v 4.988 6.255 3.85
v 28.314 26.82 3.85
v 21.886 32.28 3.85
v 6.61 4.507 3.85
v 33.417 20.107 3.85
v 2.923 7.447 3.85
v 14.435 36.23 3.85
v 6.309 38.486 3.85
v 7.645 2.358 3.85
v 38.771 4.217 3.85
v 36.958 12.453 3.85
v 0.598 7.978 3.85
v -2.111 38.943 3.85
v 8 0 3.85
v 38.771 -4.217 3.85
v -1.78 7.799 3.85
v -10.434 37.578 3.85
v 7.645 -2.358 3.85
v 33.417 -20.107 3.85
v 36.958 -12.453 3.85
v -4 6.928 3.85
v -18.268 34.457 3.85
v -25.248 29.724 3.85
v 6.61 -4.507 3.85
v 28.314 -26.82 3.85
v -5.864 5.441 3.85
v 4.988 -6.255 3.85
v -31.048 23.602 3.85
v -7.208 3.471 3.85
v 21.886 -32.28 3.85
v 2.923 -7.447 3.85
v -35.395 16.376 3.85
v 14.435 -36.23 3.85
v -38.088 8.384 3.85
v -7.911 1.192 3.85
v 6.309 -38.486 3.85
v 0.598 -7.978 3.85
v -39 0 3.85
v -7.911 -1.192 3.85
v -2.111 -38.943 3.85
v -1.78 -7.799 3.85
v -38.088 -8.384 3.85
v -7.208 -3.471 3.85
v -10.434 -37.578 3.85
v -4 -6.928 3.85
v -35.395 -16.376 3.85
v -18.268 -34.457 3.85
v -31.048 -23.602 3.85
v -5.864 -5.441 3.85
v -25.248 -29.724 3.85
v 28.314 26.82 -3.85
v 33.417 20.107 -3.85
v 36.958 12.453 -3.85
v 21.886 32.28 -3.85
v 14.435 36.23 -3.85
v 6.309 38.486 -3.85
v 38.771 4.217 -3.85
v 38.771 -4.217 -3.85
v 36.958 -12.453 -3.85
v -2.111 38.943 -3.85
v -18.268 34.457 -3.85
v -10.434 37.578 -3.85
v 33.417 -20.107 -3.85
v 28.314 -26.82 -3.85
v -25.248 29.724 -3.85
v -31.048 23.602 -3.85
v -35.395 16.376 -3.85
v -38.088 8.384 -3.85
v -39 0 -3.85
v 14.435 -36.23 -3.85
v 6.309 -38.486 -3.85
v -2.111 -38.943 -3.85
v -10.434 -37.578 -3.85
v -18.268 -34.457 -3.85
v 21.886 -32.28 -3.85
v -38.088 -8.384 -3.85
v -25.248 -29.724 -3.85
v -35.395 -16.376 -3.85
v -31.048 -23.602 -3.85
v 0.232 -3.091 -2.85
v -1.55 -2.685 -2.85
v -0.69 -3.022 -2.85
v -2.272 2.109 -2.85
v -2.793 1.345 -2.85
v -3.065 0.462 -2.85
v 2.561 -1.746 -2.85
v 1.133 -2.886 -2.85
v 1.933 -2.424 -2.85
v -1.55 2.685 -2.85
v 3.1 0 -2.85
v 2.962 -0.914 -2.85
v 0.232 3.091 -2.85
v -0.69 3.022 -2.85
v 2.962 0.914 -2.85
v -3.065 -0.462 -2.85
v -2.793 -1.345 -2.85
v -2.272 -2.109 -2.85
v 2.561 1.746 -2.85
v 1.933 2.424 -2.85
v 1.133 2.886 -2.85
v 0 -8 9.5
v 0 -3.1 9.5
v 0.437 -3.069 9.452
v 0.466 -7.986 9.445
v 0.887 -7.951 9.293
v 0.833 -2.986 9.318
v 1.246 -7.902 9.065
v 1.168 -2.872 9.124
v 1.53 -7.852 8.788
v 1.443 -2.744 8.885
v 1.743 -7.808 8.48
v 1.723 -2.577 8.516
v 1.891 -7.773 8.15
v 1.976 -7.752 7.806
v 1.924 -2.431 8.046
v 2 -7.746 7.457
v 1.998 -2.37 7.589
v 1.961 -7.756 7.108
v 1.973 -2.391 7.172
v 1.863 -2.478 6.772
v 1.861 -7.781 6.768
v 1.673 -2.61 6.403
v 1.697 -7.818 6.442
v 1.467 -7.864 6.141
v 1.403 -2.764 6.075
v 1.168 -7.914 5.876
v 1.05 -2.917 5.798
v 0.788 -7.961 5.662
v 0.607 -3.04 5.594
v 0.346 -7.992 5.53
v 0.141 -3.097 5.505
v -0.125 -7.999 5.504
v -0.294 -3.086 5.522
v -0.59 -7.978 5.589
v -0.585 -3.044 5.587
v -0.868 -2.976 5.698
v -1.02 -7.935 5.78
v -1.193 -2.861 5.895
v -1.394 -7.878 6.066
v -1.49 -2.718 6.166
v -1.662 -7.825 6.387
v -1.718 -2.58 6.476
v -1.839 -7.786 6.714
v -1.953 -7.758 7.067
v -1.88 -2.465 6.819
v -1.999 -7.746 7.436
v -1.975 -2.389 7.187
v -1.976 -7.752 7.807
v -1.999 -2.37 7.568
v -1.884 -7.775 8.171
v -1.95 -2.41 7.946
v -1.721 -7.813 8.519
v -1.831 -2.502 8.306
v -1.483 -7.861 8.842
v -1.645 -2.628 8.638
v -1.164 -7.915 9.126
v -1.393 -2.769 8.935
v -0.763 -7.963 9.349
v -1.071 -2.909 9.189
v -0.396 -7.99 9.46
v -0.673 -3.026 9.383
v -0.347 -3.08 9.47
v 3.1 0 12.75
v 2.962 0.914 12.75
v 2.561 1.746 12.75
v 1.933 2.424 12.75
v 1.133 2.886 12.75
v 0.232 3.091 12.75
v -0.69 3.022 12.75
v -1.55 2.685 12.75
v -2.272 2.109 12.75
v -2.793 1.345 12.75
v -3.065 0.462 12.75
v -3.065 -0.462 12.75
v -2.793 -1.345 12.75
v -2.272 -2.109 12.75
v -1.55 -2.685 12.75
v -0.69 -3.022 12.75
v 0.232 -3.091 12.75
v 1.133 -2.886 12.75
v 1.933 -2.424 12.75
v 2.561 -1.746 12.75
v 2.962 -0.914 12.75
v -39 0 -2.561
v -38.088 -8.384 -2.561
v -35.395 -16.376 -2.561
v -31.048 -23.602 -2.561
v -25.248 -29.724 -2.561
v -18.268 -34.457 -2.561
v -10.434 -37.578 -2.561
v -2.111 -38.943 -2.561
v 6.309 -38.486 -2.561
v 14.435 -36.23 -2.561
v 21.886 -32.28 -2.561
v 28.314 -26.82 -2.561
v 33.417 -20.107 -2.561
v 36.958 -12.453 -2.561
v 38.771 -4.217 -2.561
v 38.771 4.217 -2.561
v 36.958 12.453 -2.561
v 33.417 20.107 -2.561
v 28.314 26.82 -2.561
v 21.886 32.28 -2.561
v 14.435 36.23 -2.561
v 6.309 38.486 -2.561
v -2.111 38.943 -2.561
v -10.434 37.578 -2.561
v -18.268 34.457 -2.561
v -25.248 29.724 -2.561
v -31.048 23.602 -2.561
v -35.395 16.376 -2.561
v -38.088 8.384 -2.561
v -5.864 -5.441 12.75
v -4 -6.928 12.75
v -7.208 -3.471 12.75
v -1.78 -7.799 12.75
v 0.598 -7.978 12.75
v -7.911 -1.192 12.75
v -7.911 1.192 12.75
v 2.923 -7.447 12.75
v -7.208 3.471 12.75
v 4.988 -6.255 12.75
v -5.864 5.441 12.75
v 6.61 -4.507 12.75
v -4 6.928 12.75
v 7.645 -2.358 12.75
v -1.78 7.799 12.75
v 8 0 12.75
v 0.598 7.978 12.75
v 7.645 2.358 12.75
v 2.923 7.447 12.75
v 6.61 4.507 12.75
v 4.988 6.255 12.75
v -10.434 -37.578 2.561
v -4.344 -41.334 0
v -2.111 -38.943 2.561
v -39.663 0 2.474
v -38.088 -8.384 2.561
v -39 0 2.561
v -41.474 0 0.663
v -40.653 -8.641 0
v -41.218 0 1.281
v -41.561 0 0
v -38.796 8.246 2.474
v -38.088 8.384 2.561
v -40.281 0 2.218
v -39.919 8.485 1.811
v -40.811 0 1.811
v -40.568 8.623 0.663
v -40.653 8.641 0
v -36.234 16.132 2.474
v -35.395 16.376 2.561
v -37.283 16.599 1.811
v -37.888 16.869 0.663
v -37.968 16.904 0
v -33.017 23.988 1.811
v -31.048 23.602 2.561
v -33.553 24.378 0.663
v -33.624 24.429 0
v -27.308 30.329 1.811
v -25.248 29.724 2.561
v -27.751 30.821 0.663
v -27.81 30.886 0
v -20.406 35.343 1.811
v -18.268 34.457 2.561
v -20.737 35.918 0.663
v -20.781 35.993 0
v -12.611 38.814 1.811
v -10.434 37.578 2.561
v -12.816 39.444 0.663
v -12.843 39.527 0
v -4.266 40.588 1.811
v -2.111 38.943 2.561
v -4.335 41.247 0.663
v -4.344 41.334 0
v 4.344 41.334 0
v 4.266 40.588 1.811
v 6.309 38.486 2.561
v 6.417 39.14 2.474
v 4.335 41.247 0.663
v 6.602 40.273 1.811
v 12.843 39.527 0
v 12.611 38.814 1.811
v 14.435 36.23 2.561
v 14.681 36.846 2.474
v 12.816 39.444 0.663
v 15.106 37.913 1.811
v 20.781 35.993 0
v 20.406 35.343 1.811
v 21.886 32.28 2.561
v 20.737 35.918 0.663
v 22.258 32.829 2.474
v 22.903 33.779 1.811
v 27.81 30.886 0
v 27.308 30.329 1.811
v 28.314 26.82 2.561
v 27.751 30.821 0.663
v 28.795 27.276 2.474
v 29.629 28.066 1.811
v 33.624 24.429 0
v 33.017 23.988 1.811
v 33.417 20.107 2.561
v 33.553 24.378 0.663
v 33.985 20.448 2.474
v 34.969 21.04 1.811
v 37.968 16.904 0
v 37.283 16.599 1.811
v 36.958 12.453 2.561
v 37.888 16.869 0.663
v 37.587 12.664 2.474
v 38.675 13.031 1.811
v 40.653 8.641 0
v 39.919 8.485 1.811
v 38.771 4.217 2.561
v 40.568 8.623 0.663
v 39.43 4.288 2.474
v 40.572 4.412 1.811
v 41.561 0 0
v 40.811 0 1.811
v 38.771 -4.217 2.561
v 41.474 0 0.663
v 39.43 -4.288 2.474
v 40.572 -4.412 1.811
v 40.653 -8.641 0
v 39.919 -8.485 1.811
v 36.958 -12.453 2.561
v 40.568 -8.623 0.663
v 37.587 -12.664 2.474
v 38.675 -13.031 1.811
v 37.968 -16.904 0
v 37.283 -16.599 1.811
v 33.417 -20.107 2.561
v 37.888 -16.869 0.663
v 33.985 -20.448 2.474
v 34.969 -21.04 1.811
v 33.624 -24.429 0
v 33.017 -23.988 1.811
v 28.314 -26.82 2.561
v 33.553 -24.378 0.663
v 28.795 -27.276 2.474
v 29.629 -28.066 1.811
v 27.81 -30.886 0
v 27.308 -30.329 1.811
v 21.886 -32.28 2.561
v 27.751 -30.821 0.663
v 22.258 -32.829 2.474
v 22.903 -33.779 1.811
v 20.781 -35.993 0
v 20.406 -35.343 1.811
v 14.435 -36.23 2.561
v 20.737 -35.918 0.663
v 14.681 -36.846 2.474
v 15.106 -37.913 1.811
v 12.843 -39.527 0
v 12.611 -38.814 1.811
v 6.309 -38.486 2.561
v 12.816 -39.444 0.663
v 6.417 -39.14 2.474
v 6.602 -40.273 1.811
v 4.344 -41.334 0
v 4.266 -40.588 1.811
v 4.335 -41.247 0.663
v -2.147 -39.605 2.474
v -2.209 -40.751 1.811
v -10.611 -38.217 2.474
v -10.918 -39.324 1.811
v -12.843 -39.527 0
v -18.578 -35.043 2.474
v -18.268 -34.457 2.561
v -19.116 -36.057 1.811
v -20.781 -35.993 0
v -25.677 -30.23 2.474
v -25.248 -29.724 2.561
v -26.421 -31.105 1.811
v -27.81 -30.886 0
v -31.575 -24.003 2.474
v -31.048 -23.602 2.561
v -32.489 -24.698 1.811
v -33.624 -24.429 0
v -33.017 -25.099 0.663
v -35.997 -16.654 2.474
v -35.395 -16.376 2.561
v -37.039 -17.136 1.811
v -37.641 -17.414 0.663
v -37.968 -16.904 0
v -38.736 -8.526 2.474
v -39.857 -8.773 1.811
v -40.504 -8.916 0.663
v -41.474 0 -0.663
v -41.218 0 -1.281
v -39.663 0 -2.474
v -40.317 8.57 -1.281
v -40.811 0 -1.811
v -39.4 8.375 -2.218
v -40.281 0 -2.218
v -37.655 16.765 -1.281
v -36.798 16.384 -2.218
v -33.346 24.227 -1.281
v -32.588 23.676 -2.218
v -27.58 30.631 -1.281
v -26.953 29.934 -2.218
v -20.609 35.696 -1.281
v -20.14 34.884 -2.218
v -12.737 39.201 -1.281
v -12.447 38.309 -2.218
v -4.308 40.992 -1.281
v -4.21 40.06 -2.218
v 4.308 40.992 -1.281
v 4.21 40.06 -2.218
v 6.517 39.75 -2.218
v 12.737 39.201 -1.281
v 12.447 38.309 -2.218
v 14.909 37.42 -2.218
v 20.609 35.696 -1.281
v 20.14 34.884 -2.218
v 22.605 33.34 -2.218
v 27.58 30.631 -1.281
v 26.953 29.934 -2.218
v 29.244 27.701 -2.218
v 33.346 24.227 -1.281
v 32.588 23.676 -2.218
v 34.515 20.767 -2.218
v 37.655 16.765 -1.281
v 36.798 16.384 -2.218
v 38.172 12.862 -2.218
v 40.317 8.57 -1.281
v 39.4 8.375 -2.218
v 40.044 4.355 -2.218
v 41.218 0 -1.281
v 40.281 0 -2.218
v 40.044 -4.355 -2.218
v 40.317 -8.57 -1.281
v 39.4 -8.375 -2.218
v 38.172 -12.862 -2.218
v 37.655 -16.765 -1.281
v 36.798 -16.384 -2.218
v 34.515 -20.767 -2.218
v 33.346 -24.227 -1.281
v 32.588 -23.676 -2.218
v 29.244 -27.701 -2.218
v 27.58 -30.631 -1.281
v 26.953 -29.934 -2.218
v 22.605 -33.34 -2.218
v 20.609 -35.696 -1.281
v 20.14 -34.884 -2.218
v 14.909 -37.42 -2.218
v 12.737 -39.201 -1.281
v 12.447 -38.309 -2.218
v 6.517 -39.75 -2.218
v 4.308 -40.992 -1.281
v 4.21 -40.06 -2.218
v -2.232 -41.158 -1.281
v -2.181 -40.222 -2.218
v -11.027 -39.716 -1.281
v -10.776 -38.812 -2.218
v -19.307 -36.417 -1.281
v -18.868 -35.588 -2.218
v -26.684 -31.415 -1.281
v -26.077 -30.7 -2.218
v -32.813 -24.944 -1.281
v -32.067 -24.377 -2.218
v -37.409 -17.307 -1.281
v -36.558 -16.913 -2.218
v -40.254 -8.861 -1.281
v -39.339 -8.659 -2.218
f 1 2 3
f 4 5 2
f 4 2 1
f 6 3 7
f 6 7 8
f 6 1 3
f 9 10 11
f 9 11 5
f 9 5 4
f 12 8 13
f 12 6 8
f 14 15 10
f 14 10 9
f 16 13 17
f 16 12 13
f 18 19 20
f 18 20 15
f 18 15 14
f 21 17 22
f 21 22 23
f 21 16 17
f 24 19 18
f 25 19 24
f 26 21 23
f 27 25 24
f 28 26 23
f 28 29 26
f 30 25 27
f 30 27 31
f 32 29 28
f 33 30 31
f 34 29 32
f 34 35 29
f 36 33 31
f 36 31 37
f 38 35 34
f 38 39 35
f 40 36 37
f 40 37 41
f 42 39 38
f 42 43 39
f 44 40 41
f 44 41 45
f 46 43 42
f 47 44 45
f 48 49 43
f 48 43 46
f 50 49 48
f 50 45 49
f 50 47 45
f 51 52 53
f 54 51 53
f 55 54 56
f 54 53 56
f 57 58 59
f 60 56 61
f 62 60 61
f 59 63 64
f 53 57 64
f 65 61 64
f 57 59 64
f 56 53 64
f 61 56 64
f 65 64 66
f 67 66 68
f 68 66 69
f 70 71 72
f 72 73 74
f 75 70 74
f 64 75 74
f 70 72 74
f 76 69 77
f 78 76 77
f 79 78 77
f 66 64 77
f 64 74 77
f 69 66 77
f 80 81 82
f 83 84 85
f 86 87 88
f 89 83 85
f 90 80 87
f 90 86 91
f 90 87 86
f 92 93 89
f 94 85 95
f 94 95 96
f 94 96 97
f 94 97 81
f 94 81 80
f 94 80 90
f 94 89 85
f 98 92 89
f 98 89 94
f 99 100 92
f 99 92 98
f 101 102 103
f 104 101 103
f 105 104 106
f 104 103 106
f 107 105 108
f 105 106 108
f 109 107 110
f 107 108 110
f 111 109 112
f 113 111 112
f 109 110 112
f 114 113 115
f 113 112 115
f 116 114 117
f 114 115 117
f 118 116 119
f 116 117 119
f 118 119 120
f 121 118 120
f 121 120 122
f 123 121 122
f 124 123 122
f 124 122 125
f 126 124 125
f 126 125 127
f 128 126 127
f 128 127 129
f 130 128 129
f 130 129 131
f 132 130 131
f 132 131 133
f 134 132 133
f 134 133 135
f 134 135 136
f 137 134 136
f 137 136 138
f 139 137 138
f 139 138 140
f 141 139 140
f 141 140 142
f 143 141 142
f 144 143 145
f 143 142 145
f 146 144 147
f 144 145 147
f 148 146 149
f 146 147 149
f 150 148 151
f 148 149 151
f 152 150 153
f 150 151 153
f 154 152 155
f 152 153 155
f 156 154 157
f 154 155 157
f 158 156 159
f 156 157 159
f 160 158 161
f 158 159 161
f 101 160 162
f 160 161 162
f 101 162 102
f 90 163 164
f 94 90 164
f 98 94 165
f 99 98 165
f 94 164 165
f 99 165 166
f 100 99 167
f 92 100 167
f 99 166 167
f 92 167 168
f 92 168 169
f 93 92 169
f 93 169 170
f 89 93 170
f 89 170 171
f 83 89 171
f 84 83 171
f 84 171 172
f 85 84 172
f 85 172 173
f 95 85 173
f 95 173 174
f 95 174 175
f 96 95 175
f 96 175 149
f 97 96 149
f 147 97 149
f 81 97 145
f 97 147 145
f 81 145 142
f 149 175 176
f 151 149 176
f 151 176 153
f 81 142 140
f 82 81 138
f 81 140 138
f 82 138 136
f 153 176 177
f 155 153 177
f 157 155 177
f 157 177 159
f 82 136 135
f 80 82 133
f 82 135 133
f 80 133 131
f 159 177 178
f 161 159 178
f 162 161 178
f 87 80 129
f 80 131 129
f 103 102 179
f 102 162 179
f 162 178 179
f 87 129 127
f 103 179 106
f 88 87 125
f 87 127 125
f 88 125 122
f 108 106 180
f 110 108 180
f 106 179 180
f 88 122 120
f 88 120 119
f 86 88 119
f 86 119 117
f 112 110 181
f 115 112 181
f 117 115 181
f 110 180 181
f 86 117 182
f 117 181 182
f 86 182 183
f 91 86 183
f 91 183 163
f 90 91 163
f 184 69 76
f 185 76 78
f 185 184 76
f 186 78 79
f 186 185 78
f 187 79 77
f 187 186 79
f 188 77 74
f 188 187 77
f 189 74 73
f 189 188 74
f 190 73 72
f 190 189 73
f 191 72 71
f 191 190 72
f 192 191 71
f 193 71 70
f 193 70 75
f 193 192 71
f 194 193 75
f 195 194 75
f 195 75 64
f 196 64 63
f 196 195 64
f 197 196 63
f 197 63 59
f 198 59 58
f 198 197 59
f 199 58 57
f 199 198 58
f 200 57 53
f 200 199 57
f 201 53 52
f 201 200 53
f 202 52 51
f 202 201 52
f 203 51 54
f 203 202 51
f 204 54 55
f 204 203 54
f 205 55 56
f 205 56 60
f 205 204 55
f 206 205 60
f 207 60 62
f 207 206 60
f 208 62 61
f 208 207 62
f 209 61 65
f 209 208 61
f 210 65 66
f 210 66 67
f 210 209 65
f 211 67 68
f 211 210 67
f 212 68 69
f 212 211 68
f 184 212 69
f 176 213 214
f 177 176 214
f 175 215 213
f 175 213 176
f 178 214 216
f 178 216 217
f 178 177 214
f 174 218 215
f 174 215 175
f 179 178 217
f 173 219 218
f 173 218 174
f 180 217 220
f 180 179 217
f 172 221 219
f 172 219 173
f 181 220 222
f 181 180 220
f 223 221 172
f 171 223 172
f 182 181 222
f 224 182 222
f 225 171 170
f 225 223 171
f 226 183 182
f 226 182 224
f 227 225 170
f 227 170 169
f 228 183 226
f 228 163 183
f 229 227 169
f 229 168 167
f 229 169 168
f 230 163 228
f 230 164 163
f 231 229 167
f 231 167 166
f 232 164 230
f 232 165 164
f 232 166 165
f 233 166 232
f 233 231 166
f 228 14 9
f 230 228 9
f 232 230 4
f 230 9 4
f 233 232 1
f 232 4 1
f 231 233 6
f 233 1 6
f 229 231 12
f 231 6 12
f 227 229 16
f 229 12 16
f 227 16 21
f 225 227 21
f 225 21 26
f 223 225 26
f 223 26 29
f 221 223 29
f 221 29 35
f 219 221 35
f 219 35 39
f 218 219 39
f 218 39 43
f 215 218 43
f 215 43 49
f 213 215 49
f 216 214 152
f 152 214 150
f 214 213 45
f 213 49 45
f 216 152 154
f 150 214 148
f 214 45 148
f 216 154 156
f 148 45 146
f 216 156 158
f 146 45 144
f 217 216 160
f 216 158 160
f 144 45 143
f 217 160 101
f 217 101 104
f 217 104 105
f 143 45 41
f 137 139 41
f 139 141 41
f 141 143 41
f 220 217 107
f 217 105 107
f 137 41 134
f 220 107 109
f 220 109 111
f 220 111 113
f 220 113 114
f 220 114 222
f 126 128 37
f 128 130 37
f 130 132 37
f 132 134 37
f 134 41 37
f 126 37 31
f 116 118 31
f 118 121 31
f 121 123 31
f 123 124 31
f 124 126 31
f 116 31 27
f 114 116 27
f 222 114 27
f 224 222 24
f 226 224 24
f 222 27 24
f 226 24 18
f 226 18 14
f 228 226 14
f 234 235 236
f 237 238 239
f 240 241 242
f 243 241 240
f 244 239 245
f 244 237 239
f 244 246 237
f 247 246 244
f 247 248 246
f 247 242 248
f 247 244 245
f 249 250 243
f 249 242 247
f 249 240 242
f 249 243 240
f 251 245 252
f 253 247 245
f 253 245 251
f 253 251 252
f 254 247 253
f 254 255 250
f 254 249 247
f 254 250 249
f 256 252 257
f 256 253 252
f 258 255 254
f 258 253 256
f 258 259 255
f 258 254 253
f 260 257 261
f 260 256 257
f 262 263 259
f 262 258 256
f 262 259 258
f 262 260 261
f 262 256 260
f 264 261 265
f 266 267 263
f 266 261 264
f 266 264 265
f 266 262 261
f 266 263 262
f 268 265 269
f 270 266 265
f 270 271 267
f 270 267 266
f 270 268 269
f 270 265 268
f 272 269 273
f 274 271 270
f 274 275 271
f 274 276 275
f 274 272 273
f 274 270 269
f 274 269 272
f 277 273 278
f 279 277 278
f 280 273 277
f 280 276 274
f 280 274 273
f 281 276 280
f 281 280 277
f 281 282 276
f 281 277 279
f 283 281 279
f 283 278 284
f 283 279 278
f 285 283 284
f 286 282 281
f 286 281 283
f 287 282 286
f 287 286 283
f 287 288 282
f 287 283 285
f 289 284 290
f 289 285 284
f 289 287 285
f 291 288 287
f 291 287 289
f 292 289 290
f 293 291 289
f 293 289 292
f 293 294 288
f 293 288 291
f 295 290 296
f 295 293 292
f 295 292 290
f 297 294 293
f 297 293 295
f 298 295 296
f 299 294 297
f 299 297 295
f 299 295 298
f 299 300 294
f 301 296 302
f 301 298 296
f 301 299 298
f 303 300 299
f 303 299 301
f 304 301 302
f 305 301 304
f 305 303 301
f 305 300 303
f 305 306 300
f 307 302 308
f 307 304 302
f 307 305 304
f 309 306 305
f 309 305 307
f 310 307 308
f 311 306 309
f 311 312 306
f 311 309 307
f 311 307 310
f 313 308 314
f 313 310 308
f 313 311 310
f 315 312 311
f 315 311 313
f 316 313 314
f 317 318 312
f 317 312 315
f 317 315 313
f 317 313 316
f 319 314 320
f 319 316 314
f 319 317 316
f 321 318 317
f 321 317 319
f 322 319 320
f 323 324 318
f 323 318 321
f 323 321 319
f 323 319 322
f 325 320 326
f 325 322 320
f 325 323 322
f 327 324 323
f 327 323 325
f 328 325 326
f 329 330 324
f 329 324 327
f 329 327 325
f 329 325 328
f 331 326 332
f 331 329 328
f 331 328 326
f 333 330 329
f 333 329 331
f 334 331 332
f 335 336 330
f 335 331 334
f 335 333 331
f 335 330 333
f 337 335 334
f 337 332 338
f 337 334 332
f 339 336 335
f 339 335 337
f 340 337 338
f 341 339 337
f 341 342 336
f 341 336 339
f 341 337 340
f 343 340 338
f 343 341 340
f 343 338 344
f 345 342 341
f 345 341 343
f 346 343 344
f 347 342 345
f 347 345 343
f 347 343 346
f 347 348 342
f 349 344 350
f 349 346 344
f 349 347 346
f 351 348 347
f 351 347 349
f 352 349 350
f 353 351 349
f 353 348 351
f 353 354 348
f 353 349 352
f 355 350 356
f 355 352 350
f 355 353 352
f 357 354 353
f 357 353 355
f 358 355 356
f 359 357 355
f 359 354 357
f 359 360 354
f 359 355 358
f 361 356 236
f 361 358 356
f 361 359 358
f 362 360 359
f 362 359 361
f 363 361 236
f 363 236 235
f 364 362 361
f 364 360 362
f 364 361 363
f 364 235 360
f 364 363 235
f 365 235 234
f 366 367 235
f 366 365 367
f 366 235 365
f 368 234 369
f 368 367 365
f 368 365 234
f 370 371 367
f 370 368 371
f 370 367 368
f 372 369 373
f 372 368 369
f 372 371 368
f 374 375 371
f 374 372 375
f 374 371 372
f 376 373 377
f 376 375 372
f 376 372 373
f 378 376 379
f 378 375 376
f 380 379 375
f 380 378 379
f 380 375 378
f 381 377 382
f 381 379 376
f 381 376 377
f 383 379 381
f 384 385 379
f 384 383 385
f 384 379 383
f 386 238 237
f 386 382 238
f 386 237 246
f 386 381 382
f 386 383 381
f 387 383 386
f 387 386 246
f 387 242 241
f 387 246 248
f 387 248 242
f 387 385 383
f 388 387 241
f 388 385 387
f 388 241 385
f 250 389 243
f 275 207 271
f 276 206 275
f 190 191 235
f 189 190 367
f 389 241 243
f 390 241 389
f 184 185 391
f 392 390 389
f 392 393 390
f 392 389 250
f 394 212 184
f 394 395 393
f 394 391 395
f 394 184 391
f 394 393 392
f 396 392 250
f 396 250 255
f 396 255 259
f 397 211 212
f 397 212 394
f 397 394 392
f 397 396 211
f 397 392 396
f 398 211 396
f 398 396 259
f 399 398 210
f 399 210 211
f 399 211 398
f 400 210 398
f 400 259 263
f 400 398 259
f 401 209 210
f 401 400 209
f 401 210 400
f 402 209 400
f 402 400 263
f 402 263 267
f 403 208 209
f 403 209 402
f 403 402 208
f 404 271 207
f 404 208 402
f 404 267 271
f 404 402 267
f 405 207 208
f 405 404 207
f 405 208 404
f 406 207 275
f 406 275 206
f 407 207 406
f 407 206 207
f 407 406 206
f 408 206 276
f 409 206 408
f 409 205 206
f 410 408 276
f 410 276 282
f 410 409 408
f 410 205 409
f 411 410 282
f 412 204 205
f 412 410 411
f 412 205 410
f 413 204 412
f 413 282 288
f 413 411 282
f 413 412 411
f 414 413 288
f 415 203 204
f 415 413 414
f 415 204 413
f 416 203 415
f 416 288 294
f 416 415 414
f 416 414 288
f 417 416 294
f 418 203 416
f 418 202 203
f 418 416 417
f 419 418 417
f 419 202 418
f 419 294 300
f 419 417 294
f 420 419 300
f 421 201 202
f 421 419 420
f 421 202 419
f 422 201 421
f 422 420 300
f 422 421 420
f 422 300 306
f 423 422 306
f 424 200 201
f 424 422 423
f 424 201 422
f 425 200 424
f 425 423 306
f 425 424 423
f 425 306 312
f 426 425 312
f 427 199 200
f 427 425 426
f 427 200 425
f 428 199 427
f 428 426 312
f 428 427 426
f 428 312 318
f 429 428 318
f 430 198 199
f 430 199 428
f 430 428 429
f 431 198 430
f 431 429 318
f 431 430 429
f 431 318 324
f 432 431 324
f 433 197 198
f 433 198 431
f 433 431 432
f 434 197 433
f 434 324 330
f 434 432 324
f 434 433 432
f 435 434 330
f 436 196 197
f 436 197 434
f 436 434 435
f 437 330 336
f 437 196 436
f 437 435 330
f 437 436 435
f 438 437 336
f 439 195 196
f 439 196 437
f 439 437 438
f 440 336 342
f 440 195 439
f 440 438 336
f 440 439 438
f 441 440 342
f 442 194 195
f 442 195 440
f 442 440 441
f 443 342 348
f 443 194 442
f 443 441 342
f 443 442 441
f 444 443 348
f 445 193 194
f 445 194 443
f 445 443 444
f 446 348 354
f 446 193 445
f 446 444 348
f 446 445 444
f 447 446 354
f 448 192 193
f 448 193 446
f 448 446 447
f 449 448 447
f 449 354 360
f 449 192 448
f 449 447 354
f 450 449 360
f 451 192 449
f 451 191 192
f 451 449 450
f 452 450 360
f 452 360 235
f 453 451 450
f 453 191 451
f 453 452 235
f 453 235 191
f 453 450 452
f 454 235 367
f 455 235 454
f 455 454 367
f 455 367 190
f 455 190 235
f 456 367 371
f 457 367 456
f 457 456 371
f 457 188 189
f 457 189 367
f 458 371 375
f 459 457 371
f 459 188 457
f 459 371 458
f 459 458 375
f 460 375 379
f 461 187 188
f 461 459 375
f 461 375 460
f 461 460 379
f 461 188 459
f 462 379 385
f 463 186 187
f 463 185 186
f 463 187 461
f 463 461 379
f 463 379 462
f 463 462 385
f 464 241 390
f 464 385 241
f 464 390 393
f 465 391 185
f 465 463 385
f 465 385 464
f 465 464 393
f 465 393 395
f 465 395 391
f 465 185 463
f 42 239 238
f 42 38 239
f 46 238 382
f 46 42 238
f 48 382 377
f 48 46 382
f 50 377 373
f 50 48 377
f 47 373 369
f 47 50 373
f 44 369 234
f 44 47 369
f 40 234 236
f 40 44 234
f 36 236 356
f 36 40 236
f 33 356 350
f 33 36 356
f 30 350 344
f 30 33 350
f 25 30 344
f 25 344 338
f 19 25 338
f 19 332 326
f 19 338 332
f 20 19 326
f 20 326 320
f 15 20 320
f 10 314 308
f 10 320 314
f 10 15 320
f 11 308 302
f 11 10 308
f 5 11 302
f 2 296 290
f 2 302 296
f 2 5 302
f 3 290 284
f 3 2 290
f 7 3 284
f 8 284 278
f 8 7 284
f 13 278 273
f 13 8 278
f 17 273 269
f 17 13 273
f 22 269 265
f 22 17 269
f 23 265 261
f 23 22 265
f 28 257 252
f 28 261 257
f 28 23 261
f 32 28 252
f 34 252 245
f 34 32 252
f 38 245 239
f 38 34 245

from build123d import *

# Parameters (mm, degrees)
SKETCH1_R           = 39
BOSS_EXTRUDE1_DEPTH = 3.85
SKETCH2_R           = 2.5
SKETCH4_R           = 8
BOSS_EXTRUDE2_DEPTH = 8.9
SKETCH5_R           = 3.1
CUT_EXTRUDE1_DEPTH  = 15.6
SKETCH6_R           = 2
CUT_EXTRUDE2_DEPTH  = 57.608855314
SKETCH3_R           = 2.561236926


with BuildPart() as part:
    # Sketch1 → Boss-Extrude1 (new, symmetric)
    with BuildSketch(Plane.XY):
        with Locations(Location((0, 0, 0), (0, 0, 180))):
            Circle(SKETCH1_R)
    extrude(amount=BOSS_EXTRUDE1_DEPTH, both=True)

    # Cut-Sweep1: sweep along a curve in space
    with BuildLine() as cut_sweep1_path:
        ThreePointArc((39, 0, -3.85), (27.577164466, 27.577164466, -3.85), (0, 39, -3.85))
        ThreePointArc((0, 39, -3.85), (-27.577164466, 27.577164466, -3.85), (-39, 0, -3.85))
        ThreePointArc((-39, 0, -3.85), (-27.577164466, -27.577164466, -3.85), (0, -39, -3.85))
        ThreePointArc((0, -39, -3.85), (27.577164466, -27.577164466, -3.85), (39, 0, -3.85))
    # Sketch2 → Cut-Sweep1 (sweep, cut)
    with BuildSketch(Plane(origin=(0, 0, 0), x_dir=(1, 0, 0), z_dir=(0, 1, 0))):
        with Locations((39, 0)):
            Circle(SKETCH2_R)
    sweep(path=cut_sweep1_path.line, mode=Mode.SUBTRACT)

    # Sketch4 → Boss-Extrude2 (add)
    with BuildSketch(Plane.XY.offset(3.85)):
        Circle(SKETCH4_R)
    extrude(amount=BOSS_EXTRUDE2_DEPTH)

    # Sketch5 → Cut-Extrude1 (cut)
    with BuildSketch(Plane.XY.offset(12.75)):
        Circle(SKETCH5_R)
    extrude(amount=-CUT_EXTRUDE1_DEPTH, mode=Mode.SUBTRACT)

    # Sketch6 → Cut-Extrude2 (cut, through all)
    with BuildSketch(Plane(origin=(0, 0, 0), x_dir=(1, 0, 0), z_dir=(0, 1, 0))):
        with Locations(Location((0, -7.5, 0), (0, 0, 270))):
            Circle(SKETCH6_R)
    extrude(amount=-CUT_EXTRUDE2_DEPTH, mode=Mode.SUBTRACT)

    # Sketch3 → Revolve1 (revolve)
    with BuildSketch(Plane(origin=(0, 0, 0), x_dir=(1, 0, 0), z_dir=(0, 1, 0)), mode=Mode.PRIVATE) as revolve1_sk:
        with Locations((39, 0)):
            Circle(SKETCH3_R)
    revolve(revolve1_sk.sketch.rotate(Axis((0, 0, 12.75), (0, 0, -1)), 180), axis=Axis((0, 0, 12.75), (0, 0, -1)))


solid = part.part
